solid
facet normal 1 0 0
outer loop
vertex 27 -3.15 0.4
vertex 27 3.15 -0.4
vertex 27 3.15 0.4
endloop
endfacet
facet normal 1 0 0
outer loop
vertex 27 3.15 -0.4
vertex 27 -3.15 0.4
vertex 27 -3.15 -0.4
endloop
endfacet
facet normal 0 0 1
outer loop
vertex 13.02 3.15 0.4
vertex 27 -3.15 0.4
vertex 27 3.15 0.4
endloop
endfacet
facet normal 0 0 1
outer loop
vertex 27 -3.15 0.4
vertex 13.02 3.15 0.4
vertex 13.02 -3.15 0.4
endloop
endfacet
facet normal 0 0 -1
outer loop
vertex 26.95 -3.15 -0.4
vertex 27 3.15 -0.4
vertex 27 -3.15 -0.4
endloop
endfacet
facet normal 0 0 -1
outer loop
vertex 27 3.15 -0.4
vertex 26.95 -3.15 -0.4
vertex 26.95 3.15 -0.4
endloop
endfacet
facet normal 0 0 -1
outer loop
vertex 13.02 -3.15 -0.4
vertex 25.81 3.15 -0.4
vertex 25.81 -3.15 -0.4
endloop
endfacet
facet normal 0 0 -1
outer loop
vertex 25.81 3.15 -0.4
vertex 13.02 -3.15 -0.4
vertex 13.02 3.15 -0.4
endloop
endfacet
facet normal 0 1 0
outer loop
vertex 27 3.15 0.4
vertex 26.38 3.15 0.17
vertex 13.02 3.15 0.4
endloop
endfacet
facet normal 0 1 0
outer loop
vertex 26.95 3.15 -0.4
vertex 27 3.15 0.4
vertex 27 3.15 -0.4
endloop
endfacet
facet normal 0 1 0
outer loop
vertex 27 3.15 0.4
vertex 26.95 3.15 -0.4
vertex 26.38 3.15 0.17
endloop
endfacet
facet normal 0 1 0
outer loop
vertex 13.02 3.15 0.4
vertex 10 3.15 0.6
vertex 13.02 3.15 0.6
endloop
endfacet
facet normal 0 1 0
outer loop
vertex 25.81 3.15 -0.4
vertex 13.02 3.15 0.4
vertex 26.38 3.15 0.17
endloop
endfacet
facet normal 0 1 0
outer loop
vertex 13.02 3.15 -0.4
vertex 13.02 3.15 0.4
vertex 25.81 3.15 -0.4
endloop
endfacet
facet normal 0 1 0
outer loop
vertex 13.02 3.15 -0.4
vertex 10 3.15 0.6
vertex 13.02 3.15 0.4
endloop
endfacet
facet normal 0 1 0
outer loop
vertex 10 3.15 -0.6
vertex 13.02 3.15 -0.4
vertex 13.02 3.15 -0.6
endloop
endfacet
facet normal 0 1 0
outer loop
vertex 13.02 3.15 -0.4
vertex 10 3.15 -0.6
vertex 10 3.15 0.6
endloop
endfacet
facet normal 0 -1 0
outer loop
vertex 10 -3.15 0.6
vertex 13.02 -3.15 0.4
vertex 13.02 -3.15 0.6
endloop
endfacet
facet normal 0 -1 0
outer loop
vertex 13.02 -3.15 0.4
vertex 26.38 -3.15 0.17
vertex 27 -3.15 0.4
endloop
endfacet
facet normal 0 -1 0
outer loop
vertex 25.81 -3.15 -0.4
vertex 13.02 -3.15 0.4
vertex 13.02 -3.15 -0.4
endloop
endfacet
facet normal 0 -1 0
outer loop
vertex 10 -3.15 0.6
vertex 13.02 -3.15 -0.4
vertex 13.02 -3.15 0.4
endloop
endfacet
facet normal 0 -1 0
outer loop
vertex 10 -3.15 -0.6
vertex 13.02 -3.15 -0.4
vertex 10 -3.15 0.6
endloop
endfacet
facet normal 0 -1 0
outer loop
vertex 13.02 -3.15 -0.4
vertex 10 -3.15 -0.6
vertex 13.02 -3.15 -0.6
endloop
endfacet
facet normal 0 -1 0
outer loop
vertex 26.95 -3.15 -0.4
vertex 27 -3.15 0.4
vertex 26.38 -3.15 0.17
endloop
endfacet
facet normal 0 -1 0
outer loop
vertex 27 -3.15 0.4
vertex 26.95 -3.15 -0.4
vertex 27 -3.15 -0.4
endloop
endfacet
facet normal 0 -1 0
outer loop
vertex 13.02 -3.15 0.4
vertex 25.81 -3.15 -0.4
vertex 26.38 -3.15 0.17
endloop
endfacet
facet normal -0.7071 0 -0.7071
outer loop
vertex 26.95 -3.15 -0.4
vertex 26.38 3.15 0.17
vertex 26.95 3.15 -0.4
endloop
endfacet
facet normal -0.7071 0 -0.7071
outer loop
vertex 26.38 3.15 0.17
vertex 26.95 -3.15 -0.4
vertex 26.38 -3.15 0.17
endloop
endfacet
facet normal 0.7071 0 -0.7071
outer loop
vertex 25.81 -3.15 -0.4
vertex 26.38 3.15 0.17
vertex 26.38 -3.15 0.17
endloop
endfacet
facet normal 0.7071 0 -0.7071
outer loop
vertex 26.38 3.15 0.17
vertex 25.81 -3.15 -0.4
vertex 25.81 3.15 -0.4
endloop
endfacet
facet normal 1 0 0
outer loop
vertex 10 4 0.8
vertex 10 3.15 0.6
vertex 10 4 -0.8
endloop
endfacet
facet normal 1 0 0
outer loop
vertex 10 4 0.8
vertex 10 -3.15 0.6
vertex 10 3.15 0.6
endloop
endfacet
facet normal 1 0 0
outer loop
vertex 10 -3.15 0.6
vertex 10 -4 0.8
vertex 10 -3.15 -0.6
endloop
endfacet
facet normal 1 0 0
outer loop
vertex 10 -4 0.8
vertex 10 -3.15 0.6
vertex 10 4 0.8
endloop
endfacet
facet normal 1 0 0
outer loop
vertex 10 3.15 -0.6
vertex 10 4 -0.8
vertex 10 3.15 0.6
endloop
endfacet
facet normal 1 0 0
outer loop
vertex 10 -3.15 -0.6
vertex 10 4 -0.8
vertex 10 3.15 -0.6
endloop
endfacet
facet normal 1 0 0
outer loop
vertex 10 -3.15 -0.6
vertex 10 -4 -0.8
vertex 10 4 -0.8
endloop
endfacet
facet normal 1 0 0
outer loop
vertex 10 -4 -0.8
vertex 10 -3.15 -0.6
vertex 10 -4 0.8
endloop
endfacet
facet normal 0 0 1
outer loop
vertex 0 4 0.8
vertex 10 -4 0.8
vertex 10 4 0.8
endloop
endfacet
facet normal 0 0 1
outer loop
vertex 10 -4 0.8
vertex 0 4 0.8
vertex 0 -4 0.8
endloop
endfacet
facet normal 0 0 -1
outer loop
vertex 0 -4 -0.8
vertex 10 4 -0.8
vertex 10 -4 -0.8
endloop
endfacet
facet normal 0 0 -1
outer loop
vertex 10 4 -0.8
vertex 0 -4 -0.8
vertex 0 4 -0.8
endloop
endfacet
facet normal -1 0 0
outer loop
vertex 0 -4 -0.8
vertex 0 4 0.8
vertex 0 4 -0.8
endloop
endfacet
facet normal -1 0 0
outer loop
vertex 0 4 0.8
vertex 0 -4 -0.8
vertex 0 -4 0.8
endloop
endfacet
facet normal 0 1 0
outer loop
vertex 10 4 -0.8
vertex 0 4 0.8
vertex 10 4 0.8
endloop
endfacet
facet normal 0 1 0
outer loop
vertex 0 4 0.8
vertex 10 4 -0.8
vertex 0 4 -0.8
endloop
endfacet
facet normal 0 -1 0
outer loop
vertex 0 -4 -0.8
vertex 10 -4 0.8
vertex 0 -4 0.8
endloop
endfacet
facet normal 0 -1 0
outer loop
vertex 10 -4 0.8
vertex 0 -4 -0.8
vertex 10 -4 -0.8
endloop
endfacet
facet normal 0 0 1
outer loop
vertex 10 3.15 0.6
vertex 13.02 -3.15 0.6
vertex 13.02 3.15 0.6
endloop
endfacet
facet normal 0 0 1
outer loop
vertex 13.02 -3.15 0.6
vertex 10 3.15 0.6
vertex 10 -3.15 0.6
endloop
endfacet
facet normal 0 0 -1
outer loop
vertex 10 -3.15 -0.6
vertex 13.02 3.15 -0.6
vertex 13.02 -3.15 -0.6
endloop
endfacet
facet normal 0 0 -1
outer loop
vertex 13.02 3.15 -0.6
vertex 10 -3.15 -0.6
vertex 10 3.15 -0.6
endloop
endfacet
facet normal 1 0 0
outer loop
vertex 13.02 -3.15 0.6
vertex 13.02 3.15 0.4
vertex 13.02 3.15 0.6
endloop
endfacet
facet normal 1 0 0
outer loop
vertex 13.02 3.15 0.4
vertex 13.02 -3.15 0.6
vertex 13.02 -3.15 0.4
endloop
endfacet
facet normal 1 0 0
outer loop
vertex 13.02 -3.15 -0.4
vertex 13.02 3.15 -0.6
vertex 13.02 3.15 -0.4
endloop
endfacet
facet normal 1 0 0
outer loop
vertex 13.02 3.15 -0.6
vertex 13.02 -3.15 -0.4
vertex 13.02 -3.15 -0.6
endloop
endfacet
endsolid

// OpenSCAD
$fn=96;

// IEC-style lugless blade terminal (simplified)
// Units: mm

// Parameters
blade_len = 14.0;
blade_w   = 6.3;
blade_t   = 0.8;

base_len  = 10.0;
base_w    = 8.0;
base_t    = 1.6;

neck_len  = 3.0;
neck_w    = 6.3;
neck_t    = 1.2;

tip_chamfer = 1.2;

module chamfered_blade(len, w, t, chamfer=1.0){
    // Blade with a simple chamfered leading edge
    difference(){
        translate([0, -w/2, -t/2]) cube([len, w, t], center=false);
        // remove two wedges at the tip to create a chamfer
        translate([len-chamfer, -w/2-0.01, -t/2-0.01])
            rotate([0,45,0])
                cube([chamfer*2, w+0.02, t+0.02], center=false);
    }
}

module iec_lugless(){
    union(){
        // Base pad (where it would be crimped/attached; no lug/hole)
        translate([0, -base_w/2, -base_t/2])
            cube([base_len, base_w, base_t], center=false);

        // Neck transition
        translate([base_len, -neck_w/2, -neck_t/2])
            cube([neck_len, neck_w, neck_t], center=false);

        // Blade
        translate([base_len+neck_len, 0, 0])
            chamfered_blade(blade_len, blade_w, blade_t, tip_chamfer);

        // Small fillets via hull between base and neck (visual smoothing)
        hull(){
            translate([base_len-0.01, 0, 0])
                cube([0.02, neck_w, neck_t], center=true);
            translate([base_len-0.01, 0, 0])
                cube([0.02, base_w, base_t], center=true);
        }

        // Small fillets via hull between neck and blade
        hull(){
            translate([base_len+neck_len+0.01, 0, 0])
                cube([0.02, blade_w, blade_t], center=true);
            translate([base_len+neck_len+0.01, 0, 0])
                cube([0.02, neck_w, neck_t], center=true);
        }
    }
}

iec_lugless();
